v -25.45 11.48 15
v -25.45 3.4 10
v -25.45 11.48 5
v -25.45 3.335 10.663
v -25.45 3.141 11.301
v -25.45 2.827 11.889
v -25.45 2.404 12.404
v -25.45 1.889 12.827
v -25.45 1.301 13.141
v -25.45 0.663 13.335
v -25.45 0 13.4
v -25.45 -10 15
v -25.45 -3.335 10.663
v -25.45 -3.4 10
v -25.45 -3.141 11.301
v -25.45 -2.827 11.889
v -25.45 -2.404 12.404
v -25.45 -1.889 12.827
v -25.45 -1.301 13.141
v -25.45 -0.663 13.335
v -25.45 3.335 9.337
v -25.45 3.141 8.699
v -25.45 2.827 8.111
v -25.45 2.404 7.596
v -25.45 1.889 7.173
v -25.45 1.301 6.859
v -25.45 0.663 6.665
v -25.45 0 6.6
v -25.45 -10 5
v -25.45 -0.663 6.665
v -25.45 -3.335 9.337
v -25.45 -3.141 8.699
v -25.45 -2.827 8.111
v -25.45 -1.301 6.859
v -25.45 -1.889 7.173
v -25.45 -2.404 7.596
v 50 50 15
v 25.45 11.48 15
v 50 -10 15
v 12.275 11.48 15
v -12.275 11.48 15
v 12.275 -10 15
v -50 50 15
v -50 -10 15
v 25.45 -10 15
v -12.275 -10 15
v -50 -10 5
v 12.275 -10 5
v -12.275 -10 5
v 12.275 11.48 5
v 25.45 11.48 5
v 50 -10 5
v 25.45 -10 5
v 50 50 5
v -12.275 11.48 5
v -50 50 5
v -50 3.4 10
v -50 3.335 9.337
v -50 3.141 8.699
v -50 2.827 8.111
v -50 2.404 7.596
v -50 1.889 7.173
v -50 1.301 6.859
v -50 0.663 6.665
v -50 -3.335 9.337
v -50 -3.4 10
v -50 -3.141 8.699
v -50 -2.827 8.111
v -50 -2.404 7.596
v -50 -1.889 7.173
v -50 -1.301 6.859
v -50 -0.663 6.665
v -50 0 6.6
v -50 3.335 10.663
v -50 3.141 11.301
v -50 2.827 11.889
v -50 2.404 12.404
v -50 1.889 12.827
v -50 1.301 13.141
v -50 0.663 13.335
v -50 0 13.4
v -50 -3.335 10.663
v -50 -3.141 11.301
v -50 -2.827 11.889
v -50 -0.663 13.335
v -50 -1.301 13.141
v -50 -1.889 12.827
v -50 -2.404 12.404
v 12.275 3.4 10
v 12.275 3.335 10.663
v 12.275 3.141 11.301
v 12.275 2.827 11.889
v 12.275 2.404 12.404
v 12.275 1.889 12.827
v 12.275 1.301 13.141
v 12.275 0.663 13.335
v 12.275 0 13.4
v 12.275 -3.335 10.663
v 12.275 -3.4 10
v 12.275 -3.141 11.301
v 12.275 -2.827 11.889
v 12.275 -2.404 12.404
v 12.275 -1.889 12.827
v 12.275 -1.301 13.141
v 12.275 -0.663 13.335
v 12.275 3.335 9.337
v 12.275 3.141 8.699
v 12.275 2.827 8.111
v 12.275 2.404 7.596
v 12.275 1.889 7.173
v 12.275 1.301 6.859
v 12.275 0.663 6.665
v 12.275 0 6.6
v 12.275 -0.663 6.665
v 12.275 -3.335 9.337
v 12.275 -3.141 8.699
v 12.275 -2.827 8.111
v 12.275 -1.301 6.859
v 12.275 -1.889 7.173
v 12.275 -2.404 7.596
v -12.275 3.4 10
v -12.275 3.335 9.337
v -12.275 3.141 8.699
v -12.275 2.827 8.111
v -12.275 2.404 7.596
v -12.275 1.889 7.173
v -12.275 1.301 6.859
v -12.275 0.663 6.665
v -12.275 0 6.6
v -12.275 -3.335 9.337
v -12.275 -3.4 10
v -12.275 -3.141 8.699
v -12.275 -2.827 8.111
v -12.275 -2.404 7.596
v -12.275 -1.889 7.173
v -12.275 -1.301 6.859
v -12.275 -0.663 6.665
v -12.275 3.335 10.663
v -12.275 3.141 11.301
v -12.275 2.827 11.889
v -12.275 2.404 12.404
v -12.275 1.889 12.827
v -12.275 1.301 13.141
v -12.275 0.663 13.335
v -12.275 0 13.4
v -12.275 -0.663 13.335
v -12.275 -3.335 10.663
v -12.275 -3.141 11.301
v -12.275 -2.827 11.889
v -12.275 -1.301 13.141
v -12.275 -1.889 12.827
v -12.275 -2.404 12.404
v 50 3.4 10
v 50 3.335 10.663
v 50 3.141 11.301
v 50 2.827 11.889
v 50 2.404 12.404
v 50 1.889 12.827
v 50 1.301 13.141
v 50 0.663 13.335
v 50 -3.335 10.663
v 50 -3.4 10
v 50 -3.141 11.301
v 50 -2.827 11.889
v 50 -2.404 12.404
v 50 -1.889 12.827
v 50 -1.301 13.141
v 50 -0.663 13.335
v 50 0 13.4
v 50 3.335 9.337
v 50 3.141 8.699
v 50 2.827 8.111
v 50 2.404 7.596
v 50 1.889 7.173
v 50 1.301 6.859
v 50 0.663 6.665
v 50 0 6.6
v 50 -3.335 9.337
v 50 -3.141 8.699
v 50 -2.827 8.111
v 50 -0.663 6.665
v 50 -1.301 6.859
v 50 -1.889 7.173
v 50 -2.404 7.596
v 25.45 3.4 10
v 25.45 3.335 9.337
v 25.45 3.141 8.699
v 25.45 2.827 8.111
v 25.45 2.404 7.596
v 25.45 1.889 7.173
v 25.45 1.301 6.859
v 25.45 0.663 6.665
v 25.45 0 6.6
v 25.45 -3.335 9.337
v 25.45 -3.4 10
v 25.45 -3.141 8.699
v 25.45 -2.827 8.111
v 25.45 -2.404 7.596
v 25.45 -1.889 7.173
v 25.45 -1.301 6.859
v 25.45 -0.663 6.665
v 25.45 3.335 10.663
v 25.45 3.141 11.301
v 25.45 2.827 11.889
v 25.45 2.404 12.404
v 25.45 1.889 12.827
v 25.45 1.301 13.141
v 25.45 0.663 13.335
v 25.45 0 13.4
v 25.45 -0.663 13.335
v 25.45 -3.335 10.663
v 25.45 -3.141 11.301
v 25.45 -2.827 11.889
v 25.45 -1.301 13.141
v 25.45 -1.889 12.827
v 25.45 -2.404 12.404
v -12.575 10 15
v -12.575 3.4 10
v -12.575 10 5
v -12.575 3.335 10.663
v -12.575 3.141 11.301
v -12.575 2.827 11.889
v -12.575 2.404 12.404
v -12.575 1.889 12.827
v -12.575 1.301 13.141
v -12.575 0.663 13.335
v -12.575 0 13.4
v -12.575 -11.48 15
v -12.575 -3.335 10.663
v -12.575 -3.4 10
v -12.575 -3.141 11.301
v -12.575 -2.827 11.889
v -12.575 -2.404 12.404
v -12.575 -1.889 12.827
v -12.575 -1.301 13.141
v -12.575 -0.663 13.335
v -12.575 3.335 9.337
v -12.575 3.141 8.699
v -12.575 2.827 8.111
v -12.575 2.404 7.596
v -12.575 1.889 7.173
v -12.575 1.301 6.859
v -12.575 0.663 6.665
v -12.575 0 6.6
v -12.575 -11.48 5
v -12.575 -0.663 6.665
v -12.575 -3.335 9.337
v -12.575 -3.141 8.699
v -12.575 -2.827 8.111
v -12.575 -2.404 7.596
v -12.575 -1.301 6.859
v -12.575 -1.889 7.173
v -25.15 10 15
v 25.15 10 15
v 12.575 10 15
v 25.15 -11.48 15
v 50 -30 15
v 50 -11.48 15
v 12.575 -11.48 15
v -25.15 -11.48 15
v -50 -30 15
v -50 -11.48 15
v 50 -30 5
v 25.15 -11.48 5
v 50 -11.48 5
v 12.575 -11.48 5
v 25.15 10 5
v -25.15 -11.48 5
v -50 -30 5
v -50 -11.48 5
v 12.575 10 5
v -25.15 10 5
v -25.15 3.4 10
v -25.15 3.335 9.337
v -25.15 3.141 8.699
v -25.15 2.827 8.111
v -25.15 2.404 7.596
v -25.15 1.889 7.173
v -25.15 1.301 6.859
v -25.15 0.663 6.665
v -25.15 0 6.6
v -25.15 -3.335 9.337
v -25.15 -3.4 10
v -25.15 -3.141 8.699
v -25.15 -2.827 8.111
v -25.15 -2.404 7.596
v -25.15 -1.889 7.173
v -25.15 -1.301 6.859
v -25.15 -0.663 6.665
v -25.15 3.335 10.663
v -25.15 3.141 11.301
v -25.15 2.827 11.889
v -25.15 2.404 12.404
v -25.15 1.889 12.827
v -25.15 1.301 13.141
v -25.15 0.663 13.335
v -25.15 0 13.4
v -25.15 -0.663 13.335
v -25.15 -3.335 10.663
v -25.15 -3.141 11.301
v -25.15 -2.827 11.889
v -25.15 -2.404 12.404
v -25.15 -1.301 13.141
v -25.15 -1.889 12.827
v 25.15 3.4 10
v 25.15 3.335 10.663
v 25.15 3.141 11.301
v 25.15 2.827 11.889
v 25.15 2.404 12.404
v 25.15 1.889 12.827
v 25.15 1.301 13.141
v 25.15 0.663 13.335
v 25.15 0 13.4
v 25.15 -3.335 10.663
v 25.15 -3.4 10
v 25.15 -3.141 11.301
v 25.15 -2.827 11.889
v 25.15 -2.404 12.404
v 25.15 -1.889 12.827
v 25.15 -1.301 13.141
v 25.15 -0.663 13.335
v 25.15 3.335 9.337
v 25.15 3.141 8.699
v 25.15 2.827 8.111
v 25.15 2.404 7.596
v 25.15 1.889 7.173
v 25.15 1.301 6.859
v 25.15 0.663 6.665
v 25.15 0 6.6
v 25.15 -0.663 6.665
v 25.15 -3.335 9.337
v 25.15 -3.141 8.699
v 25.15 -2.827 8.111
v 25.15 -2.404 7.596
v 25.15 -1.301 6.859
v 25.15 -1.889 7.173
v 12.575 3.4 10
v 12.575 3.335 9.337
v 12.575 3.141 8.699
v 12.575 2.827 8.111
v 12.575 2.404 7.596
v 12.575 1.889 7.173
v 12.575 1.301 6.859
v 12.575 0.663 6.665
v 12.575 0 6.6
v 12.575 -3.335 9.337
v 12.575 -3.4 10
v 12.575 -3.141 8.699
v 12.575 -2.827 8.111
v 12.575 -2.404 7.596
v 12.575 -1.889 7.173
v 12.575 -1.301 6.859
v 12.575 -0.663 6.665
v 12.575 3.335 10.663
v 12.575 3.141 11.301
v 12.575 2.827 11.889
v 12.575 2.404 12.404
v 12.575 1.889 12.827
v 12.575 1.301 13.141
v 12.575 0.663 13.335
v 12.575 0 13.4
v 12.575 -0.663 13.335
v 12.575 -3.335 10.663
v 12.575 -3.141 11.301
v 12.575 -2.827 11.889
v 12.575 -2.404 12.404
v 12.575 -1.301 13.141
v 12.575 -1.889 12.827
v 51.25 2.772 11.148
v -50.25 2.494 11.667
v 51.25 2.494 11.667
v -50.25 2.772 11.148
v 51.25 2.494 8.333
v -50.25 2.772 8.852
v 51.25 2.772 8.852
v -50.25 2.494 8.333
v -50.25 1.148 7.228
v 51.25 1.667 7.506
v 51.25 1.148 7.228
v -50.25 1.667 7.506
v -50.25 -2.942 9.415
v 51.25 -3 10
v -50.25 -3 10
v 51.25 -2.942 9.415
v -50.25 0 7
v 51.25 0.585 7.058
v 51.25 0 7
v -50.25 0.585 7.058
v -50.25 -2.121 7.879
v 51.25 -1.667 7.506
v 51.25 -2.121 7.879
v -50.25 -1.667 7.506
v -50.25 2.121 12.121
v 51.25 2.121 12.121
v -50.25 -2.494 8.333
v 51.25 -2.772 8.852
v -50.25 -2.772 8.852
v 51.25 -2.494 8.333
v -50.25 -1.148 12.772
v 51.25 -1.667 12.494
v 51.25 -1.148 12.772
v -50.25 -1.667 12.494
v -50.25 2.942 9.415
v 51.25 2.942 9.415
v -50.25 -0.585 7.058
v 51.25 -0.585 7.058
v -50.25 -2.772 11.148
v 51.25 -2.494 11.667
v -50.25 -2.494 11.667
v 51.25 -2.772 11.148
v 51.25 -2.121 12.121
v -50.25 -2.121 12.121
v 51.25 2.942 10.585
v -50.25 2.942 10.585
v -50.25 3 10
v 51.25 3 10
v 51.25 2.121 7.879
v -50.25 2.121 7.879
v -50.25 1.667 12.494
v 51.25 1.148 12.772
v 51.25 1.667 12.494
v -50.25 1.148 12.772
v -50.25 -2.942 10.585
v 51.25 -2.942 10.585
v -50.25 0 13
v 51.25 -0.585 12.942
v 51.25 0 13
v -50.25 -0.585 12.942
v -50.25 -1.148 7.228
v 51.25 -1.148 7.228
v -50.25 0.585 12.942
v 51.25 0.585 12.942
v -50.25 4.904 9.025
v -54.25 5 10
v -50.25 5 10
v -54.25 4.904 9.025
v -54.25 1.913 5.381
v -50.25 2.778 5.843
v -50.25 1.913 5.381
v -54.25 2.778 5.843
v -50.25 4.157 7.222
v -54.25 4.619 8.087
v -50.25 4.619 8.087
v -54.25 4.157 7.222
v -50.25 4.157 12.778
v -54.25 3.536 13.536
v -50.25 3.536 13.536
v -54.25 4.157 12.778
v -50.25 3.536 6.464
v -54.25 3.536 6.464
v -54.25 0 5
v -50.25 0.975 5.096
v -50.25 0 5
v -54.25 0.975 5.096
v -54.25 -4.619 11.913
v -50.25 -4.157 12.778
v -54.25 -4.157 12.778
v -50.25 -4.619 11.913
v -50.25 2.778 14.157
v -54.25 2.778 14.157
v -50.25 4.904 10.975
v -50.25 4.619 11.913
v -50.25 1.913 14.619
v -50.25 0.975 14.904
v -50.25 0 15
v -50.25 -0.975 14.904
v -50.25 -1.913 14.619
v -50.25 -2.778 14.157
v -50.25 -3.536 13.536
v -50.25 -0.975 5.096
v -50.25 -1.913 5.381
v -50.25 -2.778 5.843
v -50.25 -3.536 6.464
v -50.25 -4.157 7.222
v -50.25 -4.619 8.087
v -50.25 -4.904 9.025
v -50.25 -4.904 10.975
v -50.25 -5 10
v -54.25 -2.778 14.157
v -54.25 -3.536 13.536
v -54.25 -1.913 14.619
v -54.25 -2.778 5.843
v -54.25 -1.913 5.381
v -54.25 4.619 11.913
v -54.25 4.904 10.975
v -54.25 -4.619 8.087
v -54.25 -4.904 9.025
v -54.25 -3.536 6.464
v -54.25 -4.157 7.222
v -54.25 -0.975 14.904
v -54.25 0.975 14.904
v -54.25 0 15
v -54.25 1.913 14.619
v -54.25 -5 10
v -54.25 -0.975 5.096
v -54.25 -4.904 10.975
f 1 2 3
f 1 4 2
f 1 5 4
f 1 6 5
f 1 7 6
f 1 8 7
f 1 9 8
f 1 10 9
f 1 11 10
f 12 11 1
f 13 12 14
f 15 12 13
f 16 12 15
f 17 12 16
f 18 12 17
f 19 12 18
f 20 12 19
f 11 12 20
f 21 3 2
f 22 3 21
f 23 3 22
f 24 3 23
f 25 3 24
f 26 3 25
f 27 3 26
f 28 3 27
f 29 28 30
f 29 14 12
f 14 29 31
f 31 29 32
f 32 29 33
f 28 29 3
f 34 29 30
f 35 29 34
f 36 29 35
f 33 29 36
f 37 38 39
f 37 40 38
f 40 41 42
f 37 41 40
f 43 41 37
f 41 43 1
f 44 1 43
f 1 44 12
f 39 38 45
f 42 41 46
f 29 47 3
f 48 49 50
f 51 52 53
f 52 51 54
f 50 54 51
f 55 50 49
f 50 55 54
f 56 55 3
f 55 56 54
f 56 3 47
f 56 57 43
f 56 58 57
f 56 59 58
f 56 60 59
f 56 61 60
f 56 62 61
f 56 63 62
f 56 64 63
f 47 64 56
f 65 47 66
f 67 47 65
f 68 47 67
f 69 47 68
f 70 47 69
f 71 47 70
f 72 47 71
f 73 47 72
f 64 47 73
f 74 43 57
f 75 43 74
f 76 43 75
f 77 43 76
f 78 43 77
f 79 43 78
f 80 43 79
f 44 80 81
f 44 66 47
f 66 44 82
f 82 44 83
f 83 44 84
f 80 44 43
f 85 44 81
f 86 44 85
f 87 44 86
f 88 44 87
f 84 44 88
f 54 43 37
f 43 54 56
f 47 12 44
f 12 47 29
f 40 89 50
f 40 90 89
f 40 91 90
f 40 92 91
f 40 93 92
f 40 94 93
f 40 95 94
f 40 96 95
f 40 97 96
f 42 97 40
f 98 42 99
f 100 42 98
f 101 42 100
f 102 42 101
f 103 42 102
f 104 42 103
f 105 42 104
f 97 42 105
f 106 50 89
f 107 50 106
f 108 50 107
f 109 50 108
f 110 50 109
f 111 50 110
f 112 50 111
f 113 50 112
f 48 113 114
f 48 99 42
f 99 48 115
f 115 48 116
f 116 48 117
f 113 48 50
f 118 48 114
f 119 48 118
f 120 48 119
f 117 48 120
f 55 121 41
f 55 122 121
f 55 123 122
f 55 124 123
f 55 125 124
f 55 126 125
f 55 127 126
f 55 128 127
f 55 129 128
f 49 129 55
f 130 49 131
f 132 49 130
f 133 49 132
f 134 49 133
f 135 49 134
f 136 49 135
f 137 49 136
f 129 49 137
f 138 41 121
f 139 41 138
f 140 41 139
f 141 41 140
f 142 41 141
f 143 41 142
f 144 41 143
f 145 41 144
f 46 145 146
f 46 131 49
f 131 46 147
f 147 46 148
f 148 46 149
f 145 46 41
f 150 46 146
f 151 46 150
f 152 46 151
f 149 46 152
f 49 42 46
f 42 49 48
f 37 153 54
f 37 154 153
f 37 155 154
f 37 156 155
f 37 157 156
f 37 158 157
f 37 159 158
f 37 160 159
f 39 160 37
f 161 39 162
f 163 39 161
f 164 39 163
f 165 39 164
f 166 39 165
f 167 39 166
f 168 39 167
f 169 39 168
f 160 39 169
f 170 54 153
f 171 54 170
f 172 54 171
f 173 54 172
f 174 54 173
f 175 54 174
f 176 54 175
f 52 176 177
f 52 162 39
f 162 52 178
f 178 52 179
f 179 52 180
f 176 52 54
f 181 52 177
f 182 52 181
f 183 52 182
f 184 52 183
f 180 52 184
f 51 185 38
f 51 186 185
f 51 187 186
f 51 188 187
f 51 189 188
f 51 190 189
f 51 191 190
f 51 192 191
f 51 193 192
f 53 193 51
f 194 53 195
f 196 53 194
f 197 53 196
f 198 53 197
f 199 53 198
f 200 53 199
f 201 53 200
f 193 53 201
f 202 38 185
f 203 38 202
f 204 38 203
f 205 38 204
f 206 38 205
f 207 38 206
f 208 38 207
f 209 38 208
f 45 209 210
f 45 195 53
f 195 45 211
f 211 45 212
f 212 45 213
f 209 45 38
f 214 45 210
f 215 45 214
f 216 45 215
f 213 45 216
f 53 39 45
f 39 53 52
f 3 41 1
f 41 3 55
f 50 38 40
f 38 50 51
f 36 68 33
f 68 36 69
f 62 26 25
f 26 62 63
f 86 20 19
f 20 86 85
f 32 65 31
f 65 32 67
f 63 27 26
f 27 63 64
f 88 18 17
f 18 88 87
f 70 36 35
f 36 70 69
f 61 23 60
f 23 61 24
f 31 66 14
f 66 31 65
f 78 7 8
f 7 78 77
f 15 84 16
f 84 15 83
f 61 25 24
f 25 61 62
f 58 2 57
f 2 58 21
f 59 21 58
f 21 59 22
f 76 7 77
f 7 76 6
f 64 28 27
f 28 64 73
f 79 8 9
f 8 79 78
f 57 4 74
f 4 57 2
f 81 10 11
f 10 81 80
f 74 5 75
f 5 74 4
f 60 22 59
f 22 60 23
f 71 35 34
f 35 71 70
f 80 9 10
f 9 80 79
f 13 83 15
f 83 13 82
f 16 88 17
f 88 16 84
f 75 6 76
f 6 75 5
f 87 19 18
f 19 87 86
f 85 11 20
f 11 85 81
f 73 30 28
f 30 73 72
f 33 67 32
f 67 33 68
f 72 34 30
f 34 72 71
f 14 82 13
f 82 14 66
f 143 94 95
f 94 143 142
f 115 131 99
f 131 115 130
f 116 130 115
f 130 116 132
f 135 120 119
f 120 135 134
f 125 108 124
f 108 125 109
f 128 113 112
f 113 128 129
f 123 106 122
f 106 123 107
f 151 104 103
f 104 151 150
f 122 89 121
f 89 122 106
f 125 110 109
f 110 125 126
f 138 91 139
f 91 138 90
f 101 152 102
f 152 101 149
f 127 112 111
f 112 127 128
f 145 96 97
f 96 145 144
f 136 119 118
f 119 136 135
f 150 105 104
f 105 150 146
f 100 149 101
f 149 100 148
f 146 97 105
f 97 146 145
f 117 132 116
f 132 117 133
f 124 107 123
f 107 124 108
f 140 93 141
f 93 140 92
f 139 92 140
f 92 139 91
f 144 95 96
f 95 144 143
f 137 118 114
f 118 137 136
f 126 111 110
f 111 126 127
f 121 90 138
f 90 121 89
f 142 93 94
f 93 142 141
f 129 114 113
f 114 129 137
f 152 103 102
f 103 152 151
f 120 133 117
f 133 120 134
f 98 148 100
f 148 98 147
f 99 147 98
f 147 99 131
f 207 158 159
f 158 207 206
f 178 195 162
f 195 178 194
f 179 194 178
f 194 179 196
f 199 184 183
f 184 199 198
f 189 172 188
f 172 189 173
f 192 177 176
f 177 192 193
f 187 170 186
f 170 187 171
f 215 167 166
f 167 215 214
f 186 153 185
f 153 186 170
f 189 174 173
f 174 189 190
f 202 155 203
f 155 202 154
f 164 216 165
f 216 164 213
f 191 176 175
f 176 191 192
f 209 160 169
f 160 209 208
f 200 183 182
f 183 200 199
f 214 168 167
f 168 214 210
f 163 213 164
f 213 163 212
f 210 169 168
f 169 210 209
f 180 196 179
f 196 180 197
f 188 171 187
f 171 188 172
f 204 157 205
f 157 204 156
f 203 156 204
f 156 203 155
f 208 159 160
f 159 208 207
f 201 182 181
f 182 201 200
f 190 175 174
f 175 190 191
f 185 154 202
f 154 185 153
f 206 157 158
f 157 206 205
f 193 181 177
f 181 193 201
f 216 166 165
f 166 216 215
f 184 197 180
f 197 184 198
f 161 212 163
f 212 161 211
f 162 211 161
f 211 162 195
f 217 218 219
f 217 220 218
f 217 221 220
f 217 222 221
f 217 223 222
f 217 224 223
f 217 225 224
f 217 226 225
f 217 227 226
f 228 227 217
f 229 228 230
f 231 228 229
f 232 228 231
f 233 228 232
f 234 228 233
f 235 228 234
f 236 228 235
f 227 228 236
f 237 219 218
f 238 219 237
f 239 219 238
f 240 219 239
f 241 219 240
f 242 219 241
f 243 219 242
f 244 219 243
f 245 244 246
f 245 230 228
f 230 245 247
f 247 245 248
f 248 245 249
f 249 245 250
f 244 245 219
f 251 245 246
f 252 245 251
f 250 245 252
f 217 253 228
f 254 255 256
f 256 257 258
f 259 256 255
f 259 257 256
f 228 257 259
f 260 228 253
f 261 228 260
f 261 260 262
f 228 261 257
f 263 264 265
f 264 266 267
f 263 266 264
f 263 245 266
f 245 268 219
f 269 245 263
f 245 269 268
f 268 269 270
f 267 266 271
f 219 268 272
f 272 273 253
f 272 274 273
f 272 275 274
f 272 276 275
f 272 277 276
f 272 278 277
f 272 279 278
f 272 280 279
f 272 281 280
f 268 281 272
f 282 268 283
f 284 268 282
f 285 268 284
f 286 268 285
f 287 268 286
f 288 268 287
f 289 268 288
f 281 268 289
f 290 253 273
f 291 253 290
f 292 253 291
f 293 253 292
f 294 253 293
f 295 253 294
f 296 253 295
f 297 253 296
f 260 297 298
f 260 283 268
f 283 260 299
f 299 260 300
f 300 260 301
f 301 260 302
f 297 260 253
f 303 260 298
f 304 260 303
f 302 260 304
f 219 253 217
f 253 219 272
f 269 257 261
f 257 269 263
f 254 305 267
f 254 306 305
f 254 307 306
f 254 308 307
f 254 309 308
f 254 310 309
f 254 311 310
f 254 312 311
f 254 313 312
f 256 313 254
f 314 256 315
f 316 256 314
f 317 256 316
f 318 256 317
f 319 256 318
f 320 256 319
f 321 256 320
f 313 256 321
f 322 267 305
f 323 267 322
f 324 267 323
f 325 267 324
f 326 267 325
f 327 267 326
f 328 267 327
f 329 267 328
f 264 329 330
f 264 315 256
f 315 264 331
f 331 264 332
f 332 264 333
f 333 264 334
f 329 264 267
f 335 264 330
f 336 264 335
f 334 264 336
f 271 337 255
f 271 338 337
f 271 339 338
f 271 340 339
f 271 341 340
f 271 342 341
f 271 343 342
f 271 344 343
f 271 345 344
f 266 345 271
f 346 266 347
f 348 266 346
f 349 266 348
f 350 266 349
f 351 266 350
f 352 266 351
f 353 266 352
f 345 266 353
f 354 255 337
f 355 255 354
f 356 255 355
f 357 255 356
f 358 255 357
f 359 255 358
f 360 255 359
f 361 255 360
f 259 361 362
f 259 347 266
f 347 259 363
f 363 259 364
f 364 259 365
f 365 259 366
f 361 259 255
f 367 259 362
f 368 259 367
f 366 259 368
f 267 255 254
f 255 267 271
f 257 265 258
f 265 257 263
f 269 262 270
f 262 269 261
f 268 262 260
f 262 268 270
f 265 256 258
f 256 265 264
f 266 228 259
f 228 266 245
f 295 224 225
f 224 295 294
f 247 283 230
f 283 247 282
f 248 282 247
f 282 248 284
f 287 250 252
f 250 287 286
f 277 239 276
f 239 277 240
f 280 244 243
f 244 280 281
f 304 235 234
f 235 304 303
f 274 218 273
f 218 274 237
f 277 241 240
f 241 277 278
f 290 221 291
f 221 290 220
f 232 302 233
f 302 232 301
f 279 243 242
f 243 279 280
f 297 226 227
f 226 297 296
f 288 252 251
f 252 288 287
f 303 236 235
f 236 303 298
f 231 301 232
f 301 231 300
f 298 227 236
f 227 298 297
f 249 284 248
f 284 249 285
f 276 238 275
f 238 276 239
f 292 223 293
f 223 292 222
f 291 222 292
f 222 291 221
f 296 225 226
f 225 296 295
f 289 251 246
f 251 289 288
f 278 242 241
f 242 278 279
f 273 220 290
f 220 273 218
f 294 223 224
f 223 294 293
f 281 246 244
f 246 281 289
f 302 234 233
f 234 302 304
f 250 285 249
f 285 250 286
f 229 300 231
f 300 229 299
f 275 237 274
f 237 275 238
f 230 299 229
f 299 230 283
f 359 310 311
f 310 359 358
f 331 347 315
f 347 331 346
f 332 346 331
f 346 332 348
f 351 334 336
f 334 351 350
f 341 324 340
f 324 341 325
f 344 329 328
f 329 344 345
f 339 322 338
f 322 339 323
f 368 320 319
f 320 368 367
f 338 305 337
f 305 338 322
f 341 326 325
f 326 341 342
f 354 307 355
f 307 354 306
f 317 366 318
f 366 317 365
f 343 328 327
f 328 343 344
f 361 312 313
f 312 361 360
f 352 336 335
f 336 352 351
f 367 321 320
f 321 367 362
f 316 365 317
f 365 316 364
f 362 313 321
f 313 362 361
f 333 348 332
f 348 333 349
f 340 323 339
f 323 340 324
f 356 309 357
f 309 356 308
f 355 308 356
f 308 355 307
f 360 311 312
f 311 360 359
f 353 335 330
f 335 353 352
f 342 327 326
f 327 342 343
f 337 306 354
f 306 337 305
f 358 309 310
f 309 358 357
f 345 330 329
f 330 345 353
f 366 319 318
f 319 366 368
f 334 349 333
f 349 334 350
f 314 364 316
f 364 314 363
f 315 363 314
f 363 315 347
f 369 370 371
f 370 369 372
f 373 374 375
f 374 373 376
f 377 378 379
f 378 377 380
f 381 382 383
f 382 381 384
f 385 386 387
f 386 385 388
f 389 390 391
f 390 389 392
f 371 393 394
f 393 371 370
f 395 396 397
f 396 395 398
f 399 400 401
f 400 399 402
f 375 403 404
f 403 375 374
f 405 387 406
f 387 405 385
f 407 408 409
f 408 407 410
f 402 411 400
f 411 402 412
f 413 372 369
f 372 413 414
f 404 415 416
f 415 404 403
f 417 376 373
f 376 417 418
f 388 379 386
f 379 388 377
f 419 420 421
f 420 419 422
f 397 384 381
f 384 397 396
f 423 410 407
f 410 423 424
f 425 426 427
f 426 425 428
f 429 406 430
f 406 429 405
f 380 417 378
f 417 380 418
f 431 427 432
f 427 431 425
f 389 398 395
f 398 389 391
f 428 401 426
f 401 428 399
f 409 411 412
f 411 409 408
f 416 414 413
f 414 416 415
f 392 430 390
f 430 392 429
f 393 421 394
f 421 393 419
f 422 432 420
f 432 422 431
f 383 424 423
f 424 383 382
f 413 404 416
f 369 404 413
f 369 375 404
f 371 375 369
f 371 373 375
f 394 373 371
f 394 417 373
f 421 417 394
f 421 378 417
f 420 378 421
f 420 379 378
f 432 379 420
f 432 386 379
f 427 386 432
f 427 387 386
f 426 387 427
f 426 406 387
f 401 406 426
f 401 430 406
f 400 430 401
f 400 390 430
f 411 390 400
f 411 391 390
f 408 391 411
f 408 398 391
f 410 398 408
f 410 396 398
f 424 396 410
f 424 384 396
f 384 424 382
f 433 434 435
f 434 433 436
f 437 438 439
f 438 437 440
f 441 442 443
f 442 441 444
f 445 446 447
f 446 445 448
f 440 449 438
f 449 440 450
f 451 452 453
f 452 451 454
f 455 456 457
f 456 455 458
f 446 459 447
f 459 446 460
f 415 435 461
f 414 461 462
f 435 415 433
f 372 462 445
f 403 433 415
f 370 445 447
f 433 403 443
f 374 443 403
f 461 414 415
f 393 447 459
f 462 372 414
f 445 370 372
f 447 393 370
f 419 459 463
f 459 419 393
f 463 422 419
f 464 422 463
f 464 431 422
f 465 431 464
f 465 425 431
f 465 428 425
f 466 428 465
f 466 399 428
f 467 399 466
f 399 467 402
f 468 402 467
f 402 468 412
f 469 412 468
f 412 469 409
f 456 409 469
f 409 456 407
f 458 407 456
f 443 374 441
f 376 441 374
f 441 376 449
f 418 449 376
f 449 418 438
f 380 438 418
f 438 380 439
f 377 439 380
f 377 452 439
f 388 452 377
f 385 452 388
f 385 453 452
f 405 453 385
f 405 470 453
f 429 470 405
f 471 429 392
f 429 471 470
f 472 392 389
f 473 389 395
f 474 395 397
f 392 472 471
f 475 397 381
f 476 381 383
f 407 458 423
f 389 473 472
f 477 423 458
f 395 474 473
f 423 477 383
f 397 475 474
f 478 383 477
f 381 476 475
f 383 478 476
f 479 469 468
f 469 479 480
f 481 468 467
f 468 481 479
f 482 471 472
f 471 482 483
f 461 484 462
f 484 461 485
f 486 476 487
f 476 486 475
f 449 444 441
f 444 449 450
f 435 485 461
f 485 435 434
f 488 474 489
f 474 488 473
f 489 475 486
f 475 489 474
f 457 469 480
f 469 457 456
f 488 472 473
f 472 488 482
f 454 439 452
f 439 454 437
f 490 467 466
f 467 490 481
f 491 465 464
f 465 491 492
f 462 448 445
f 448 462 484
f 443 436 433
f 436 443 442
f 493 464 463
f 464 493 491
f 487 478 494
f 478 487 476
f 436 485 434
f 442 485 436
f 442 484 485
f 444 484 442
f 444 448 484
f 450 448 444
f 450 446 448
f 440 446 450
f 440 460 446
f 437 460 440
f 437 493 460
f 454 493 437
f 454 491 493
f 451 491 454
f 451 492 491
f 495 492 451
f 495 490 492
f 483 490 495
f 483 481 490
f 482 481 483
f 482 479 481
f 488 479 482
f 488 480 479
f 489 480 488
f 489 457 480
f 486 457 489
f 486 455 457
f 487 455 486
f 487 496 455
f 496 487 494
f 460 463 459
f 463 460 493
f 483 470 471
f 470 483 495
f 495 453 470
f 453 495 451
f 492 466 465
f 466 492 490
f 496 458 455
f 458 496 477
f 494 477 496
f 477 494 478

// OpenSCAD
$fn = 32;

// ------------------------------------------------------------------------
// Butt hinge: hinge 100 mm, leaf swung 0 deg
// Every part is its own module, assembly() places every instance.
// ------------------------------------------------------------------------

// --- part 1 ---
module hinge_base() {
  difference() {
    union() {
      translate([-50, -10, -5]) cube([24.55, 60, 10]);
      translate([-12.275, -10, -5]) cube([24.55, 60, 10]);
      translate([25.45, -10, -5]) cube([24.55, 60, 10]);
      translate([-50, 11.48, -5]) cube([100, 38.52, 10]);
    }
    translate([-37.725, 0, 0]) rotate([0, 90, 0]) cylinder(h = 26.55, d = 6.8, center = true);
    translate([0, 0, 0]) rotate([0, 90, 0]) cylinder(h = 26.55, d = 6.8, center = true);
    translate([37.725, 0, 0]) rotate([0, 90, 0]) cylinder(h = 26.55, d = 6.8, center = true);
  }
}

// --- part 2 ---
module hinge_mover() {
  difference() {
    union() {
      translate([-25.15, -30, -5]) cube([12.575, 40, 10]);
      translate([12.575, -30, -5]) cube([12.575, 40, 10]);
      translate([-50, -30, -5]) cube([100, 18.52, 10]);
    }
    translate([-18.863, 0, 0]) rotate([0, 90, 0]) cylinder(h = 14.575, d = 6.8, center = true);
    translate([18.863, 0, 0]) rotate([0, 90, 0]) cylinder(h = 14.575, d = 6.8, center = true);
  }
}

// --- part 3 ---
module hinge_pin() {
  rotate([0, 90, 0]) cylinder(h = 102.5, d = 6, center = true);
  translate([-54.25, 0, 0]) rotate([0, 90, 0]) cylinder(h = 4, d = 10);
}

// --- assembly ---
module assembly() {
  color([0.80, 0.24, 0.20]) translate([0, 0, 10]) rotate([0, 0, 0]) hinge_base();
  color([0.20, 0.45, 0.75]) translate([0, 0, 10]) rotate([0, 0, 0]) hinge_mover();
  color([0.25, 0.62, 0.32]) translate([0, 0, 10]) rotate([0, 0, 0]) hinge_pin();
}

assembly();
